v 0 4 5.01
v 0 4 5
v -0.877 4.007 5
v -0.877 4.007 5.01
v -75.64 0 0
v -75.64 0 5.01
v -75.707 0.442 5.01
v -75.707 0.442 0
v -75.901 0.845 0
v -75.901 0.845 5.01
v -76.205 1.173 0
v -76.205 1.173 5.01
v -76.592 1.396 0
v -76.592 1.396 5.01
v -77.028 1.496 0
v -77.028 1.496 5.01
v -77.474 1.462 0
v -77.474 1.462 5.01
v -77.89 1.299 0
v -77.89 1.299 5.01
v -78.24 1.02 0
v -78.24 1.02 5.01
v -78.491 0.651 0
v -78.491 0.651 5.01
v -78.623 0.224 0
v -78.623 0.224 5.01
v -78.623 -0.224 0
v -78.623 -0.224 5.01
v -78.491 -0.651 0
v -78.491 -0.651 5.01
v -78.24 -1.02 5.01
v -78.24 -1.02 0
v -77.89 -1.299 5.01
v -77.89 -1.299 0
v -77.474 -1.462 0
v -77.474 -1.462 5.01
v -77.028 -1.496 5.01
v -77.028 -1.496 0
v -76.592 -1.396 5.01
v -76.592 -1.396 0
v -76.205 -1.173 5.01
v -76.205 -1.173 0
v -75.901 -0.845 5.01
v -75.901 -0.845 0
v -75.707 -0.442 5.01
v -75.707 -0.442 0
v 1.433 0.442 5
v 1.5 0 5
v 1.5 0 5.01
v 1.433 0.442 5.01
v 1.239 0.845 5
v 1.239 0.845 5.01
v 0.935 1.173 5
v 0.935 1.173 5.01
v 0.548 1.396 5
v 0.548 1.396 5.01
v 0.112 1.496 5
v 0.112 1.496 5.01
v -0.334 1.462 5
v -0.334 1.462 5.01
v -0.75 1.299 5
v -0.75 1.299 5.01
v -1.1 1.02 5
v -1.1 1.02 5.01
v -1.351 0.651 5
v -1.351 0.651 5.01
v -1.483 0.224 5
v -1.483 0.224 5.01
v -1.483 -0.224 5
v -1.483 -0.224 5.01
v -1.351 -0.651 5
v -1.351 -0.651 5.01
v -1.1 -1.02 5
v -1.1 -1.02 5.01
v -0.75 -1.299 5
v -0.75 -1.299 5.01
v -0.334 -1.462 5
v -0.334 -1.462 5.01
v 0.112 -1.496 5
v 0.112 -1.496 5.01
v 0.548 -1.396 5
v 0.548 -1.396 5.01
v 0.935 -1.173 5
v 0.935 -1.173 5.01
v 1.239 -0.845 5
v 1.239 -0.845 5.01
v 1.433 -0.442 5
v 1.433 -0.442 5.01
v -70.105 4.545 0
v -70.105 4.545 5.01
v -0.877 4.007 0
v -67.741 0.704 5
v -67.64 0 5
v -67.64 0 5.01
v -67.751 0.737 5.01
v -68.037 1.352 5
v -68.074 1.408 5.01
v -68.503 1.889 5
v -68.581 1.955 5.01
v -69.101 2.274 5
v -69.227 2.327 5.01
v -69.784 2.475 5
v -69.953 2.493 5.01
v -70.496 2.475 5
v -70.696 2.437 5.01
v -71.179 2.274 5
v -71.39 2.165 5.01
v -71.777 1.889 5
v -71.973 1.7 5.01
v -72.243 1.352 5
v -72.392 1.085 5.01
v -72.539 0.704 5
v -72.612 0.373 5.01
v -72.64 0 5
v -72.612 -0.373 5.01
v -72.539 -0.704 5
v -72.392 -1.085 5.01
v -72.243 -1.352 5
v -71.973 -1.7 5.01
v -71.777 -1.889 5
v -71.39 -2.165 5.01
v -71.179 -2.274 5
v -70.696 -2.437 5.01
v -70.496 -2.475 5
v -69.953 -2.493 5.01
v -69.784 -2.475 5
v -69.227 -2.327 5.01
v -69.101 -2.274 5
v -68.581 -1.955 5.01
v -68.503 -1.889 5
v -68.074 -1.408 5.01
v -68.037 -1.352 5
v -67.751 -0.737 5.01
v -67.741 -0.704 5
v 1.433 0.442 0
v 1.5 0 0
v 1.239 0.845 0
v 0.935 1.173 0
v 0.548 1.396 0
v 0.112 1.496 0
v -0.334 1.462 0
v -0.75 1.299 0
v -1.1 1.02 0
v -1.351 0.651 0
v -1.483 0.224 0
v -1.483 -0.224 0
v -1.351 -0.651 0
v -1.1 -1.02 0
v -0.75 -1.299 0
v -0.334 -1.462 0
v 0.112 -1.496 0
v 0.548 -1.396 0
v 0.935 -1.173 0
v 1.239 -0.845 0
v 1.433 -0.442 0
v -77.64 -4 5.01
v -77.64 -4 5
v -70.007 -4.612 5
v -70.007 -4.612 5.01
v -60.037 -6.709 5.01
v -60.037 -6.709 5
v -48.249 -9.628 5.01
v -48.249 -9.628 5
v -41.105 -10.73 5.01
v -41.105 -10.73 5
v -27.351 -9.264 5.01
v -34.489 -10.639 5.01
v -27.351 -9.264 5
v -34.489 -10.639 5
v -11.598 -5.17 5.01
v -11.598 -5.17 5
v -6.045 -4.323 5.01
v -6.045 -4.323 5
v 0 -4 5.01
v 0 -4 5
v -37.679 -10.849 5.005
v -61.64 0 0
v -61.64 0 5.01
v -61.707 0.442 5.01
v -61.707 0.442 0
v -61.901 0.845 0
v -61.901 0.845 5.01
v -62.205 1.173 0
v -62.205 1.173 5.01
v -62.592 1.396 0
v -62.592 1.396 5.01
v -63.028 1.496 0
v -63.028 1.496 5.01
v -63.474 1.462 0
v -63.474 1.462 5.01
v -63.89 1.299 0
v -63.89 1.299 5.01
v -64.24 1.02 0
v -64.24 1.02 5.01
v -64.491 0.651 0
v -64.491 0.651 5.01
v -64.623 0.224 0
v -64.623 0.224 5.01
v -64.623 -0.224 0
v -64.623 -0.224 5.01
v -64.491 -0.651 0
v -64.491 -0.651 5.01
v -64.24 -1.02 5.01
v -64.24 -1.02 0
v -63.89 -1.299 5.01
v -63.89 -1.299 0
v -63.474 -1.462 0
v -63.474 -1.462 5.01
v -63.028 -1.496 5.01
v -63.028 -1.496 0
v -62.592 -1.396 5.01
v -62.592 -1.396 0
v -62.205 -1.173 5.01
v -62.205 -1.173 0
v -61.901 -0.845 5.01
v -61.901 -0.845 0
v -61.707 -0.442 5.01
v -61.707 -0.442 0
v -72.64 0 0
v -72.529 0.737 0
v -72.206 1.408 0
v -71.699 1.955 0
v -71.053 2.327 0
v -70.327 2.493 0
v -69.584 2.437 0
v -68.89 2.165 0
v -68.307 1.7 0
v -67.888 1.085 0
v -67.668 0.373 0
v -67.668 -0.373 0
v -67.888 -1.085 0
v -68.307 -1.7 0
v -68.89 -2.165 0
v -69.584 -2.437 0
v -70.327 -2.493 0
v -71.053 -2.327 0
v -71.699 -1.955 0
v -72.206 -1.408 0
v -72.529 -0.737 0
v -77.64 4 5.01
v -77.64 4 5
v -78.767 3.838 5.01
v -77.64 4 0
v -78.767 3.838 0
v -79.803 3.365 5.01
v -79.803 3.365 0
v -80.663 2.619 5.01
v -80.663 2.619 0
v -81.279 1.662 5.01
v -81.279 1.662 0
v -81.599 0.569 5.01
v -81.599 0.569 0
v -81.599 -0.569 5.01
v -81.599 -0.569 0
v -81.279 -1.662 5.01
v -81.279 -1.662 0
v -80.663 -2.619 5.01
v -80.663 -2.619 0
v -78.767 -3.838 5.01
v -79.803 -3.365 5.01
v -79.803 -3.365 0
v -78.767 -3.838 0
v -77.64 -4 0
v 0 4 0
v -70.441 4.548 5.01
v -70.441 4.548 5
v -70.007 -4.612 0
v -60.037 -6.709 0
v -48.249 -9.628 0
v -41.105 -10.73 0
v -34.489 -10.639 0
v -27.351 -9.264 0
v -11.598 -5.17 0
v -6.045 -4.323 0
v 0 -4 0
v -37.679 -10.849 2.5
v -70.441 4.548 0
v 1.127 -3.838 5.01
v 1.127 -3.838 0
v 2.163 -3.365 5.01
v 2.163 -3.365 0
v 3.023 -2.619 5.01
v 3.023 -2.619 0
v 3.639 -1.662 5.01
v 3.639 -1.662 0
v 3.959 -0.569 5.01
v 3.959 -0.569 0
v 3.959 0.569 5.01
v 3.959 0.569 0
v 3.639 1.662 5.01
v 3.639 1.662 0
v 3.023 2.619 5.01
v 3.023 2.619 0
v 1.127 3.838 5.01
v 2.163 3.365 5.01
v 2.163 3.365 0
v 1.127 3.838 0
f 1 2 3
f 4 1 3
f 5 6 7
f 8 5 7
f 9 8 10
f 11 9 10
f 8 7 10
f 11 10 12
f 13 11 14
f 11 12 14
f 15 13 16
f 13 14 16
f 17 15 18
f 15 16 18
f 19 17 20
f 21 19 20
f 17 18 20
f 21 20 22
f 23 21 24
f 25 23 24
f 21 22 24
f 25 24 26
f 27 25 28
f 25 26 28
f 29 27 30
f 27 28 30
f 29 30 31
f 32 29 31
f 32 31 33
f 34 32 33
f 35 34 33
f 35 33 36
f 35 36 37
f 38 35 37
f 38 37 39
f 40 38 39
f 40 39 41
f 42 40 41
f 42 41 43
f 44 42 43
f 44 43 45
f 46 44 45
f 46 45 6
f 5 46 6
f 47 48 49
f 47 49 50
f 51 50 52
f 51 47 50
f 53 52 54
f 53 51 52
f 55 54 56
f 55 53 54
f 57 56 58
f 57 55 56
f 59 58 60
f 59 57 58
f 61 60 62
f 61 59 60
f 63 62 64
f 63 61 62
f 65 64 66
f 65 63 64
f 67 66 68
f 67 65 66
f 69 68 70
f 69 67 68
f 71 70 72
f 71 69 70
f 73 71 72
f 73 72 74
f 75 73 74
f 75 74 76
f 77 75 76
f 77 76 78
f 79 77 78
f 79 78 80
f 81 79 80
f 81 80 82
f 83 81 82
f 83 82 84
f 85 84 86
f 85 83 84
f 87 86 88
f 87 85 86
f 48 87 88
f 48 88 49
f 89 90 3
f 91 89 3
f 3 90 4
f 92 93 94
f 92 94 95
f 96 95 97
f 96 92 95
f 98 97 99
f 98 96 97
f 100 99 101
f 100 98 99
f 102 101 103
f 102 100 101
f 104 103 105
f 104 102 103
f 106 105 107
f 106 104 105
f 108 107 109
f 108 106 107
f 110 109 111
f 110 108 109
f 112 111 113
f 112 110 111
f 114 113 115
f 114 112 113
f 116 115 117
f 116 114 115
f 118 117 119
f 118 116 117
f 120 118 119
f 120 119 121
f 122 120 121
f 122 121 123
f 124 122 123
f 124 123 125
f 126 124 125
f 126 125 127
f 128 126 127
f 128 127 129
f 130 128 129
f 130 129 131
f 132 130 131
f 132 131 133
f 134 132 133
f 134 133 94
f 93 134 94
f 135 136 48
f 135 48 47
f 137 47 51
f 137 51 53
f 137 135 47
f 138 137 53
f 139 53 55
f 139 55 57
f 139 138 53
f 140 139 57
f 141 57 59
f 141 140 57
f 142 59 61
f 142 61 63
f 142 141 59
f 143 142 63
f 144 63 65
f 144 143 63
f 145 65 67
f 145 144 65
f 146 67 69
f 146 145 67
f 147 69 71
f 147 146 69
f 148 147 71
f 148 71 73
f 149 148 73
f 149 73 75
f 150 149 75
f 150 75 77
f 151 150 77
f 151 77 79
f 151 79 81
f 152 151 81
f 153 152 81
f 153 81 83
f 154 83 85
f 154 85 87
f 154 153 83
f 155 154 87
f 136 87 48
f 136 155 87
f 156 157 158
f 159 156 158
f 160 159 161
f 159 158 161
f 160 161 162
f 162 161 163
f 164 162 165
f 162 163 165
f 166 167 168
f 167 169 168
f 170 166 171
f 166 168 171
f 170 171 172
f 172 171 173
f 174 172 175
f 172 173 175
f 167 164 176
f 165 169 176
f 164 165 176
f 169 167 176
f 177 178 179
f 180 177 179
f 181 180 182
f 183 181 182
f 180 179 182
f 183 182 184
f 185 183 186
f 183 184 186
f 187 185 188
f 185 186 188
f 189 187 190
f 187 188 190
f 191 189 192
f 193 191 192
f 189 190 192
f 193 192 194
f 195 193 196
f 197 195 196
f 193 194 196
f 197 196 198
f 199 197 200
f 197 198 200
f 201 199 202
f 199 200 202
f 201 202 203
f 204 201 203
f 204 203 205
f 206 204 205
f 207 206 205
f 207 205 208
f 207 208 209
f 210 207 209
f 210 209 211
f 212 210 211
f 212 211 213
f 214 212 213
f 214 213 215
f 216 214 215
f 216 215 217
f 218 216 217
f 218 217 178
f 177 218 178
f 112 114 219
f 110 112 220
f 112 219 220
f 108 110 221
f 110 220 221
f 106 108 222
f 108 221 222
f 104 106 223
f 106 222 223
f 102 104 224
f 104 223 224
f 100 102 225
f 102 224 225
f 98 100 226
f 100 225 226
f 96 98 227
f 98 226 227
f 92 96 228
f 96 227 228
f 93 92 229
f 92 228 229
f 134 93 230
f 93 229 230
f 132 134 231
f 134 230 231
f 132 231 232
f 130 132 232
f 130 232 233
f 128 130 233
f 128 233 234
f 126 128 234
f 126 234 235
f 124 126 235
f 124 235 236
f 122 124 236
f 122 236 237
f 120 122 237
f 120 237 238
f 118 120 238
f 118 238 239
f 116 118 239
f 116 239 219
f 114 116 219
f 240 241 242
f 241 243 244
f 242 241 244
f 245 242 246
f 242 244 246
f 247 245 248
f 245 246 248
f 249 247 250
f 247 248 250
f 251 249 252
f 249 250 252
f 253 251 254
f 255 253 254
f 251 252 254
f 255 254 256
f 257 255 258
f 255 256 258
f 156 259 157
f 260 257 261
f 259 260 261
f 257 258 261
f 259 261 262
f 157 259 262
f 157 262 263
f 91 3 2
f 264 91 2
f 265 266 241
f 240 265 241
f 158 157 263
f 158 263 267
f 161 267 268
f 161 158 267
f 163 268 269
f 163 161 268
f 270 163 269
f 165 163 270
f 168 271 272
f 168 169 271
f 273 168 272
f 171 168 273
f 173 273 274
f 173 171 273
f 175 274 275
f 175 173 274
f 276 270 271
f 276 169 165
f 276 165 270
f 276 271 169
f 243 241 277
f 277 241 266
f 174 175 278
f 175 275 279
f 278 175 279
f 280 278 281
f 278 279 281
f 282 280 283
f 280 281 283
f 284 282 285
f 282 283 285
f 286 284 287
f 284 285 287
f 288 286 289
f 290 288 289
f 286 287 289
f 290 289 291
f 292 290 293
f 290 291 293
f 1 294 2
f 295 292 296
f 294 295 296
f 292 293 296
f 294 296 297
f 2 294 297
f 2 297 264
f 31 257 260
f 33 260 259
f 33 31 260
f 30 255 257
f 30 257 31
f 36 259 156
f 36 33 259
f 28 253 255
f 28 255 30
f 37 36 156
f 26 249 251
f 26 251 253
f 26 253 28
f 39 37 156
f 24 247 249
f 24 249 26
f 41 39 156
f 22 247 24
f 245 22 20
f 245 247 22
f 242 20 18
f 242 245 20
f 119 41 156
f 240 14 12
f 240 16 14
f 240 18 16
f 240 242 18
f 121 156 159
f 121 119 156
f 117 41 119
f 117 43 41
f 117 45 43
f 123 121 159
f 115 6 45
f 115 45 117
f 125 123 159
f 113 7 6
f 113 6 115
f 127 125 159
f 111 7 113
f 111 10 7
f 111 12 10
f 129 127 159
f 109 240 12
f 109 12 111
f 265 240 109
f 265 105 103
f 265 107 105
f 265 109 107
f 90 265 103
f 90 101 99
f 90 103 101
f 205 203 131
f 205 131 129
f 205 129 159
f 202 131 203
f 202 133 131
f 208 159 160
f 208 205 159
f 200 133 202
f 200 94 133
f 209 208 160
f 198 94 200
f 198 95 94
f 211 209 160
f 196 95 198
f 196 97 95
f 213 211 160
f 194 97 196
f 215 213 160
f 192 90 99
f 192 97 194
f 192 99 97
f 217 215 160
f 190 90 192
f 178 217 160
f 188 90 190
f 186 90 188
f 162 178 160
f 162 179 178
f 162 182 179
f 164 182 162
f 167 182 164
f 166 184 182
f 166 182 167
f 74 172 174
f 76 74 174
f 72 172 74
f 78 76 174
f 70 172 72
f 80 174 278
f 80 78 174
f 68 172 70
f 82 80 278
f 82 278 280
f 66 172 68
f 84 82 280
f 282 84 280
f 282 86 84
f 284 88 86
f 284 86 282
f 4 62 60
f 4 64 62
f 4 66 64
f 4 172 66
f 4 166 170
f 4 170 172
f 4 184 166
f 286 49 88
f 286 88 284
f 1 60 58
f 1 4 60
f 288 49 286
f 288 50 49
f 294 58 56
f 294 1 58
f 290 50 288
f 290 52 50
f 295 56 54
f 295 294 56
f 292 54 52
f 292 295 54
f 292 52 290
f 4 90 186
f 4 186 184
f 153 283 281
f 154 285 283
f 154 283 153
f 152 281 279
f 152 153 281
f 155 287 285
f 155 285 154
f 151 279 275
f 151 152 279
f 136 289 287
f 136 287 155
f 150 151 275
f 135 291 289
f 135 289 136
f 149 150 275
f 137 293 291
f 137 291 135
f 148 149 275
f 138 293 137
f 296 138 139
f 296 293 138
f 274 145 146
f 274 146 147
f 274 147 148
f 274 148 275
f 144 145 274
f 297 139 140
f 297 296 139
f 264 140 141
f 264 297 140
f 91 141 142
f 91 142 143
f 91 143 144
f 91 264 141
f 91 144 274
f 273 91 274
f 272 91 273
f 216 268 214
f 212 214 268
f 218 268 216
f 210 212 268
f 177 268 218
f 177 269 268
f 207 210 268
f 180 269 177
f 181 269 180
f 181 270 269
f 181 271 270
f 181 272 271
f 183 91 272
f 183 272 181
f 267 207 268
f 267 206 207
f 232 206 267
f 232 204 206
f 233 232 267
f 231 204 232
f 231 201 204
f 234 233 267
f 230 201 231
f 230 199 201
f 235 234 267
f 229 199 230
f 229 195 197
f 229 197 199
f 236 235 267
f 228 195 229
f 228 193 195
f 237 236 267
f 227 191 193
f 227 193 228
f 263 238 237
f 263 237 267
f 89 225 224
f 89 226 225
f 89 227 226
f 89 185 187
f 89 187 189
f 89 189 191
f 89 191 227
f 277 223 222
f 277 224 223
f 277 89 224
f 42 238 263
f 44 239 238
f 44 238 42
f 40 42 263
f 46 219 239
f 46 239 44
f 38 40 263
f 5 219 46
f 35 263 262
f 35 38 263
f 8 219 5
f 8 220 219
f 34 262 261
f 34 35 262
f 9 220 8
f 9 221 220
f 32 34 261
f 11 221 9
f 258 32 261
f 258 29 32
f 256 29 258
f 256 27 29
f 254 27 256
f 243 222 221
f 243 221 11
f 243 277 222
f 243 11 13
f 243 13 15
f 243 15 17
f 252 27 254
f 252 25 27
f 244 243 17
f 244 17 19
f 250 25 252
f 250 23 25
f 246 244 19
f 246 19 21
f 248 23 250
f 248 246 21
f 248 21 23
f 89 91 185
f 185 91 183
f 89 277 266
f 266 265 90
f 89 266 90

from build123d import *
from build123d.topology import SkipClean

# Parameters (mm, degrees)
SKETCH1_R             = 1.5
BOSS_EXTRUDE1_DEPTH   = 5
BOSS_EXTRUDE3_DEPTH   = 5
SKETCH4_R             = 2.5
CUT_EXTRUDE2_DEPTH    = 5
BOSS_EXTRUDE4_DEPTH   = 5
BOSS_EXTRUDE4_2_DEPTH = 5
SKETCH7_R             = 1.5
SKETCH7_R_2           = 2.5
BOSS_EXTRUDE5_DEPTH   = 0.01
CUT_EXTRUDE3_DEPTH    = 10
SKETCH10_R            = 1.5
CUT_EXTRUDE4_DEPTH    = 10


with BuildPart() as part:
    # Sketch1 → Boss-Extrude1 (new body)
    with BuildSketch(Plane.XY):
        with BuildLine():
            Line((0, -4), (-70.14, -4))
            ThreePointArc((-70.14, -4), (-74.14, 0), (-70.14, 4))
            Line((-70.14, 4), (0, 4))
            ThreePointArc((0, 4), (4, 0), (0, -4))
        make_face()
        with Locations((-70.14, 0)):
            Circle(SKETCH1_R, mode=Mode.SUBTRACT)
        Circle(SKETCH1_R, mode=Mode.SUBTRACT)
    extrude(amount=BOSS_EXTRUDE1_DEPTH)

    # Sketch3 → Boss-Extrude3 (add)
    with BuildSketch(Plane.XY):
        with BuildLine():
            Line((-70.14, -4), (-77.64, -4))
            ThreePointArc((-77.64, -4), (-81.64, 0), (-77.64, 4))
            Line((-77.64, 4), (-70.14, 4))
            ThreePointArc((-70.14, 4), (-66.14, 0), (-70.14, -4))
        make_face()
    extrude(amount=BOSS_EXTRUDE3_DEPTH)

    # Sketch4 → Cut-Extrude2 (cut)
    with BuildSketch(Plane(origin=(0, 0, 0), x_dir=(-1, 0, 0), z_dir=(0, 0, -1))):
        with Locations((70.14, 0)):
            Circle(SKETCH4_R)
    extrude(amount=-CUT_EXTRUDE2_DEPTH, mode=Mode.SUBTRACT)



with BuildPart() as body_2:
    # Sketch5 → Boss-Extrude4 (new body)
    with BuildSketch(Plane.XY.offset(5)):
        with BuildLine():
            Line((0, -4), (-77.64, -4))
            add(Edge.make_bspline(
                [(-77.64, -4), (-63.527561679, -4), (-37.041969255, -17.709059975), (-15.820527041, -4), (0, -4)],
                knots=[0, 0, 0, 0, 0.514247309, 1, 1, 1, 1], degree=3))
        make_face()
    extrude(amount=-BOSS_EXTRUDE4_DEPTH)


with BuildPart() as body_3:
    # Sketch5 → Boss-Extrude4 2 (new body)
    with BuildSketch(Plane.XY.offset(5)):
        with BuildLine():
            add(Edge.make_bspline(
                [(-77.64, 4), (-63.527561679, 4), (-37.041969255, 17.709059975), (-15.820527041, 4), (0, 4)],
                knots=[0, 0, 0, 0, 0.514247309, 1, 1, 1, 1], degree=3))
            Line((-77.64, 4), (0, 4))
        make_face()
    extrude(amount=-BOSS_EXTRUDE4_2_DEPTH)


with BuildPart() as part_1:
    with SkipClean():  # the faces are left unmerged after this step: merging them gives an invalid solid
        add(part.part)

        add(body_2.part)  # Boss-Extrude5 merges body 2

        add(body_3.part)  # Boss-Extrude5 merges body 3
        # Sketch7 → Boss-Extrude5 (add)
        with BuildSketch(Plane.XY.offset(5)):
            with BuildLine():
                add(Edge.make_bspline(
                    [(0, 4), (-15.820527041, 4), (-37.041969255, 17.709059975), (-63.527561679, 4), (-77.64, 4)],
                    knots=[0, 0, 0, 0, 0.485752691, 1, 1, 1, 1], degree=3))
                ThreePointArc((-77.64, 4), (-81.64, 0), (-77.64, -4))
                add(Edge.make_bspline(
                    [(-77.64, -4), (-63.527561679, -4), (-37.041969255, -17.709059975), (-15.820527041, -4), (0, -4)],
                    knots=[0, 0, 0, 0, 0.514247309, 1, 1, 1, 1], degree=3))
                ThreePointArc((0, -4), (4, 0), (0, 4))
            make_face()
            Circle(SKETCH7_R, mode=Mode.SUBTRACT)
            with Locations((-70.14, 0)):
                Circle(SKETCH7_R_2, mode=Mode.SUBTRACT)
        extrude(amount=BOSS_EXTRUDE5_DEPTH)
    add(part_1.part.scale(1), mode=Mode.REPLACE)  # the faces are merged on a copy

    # Sketch9 → Cut-Extrude3 (cut)
    with BuildSketch(Plane.XY.offset(5.01)):
        with BuildLine():
            add(Edge.make_bspline(
                [(-0.876672038, 4.006820197), (-16.204235996, 4.245362878), (-35.408867191, 16.400266247), (-58.905371653, 6.201116002), (-70.440504523, 4.548002129)],
                knots=[0.009030481, 0.009030481, 0.009030481, 0.009030481, 0.485752691, 0.911971345, 0.911971345, 0.911971345, 0.911971345], degree=3))
            Line((-70.440504523, 4.548002129), (-70.104638549, 4.545389211))
            Line((-70.104638549, 4.545389211), (-0.876672038, 4.006820197))
        make_face()
    extrude(amount=-CUT_EXTRUDE3_DEPTH, mode=Mode.SUBTRACT)

    # Sketch10 → Cut-Extrude4 (cut)
    with BuildSketch(Plane.XY.offset(5.01)):
        with Locations((-63.14, 0)):
            Circle(SKETCH10_R)
        with Locations((-77.14, 0)):
            Circle(SKETCH10_R)
    extrude(amount=-CUT_EXTRUDE4_DEPTH, mode=Mode.SUBTRACT)


solid = part_1.part
